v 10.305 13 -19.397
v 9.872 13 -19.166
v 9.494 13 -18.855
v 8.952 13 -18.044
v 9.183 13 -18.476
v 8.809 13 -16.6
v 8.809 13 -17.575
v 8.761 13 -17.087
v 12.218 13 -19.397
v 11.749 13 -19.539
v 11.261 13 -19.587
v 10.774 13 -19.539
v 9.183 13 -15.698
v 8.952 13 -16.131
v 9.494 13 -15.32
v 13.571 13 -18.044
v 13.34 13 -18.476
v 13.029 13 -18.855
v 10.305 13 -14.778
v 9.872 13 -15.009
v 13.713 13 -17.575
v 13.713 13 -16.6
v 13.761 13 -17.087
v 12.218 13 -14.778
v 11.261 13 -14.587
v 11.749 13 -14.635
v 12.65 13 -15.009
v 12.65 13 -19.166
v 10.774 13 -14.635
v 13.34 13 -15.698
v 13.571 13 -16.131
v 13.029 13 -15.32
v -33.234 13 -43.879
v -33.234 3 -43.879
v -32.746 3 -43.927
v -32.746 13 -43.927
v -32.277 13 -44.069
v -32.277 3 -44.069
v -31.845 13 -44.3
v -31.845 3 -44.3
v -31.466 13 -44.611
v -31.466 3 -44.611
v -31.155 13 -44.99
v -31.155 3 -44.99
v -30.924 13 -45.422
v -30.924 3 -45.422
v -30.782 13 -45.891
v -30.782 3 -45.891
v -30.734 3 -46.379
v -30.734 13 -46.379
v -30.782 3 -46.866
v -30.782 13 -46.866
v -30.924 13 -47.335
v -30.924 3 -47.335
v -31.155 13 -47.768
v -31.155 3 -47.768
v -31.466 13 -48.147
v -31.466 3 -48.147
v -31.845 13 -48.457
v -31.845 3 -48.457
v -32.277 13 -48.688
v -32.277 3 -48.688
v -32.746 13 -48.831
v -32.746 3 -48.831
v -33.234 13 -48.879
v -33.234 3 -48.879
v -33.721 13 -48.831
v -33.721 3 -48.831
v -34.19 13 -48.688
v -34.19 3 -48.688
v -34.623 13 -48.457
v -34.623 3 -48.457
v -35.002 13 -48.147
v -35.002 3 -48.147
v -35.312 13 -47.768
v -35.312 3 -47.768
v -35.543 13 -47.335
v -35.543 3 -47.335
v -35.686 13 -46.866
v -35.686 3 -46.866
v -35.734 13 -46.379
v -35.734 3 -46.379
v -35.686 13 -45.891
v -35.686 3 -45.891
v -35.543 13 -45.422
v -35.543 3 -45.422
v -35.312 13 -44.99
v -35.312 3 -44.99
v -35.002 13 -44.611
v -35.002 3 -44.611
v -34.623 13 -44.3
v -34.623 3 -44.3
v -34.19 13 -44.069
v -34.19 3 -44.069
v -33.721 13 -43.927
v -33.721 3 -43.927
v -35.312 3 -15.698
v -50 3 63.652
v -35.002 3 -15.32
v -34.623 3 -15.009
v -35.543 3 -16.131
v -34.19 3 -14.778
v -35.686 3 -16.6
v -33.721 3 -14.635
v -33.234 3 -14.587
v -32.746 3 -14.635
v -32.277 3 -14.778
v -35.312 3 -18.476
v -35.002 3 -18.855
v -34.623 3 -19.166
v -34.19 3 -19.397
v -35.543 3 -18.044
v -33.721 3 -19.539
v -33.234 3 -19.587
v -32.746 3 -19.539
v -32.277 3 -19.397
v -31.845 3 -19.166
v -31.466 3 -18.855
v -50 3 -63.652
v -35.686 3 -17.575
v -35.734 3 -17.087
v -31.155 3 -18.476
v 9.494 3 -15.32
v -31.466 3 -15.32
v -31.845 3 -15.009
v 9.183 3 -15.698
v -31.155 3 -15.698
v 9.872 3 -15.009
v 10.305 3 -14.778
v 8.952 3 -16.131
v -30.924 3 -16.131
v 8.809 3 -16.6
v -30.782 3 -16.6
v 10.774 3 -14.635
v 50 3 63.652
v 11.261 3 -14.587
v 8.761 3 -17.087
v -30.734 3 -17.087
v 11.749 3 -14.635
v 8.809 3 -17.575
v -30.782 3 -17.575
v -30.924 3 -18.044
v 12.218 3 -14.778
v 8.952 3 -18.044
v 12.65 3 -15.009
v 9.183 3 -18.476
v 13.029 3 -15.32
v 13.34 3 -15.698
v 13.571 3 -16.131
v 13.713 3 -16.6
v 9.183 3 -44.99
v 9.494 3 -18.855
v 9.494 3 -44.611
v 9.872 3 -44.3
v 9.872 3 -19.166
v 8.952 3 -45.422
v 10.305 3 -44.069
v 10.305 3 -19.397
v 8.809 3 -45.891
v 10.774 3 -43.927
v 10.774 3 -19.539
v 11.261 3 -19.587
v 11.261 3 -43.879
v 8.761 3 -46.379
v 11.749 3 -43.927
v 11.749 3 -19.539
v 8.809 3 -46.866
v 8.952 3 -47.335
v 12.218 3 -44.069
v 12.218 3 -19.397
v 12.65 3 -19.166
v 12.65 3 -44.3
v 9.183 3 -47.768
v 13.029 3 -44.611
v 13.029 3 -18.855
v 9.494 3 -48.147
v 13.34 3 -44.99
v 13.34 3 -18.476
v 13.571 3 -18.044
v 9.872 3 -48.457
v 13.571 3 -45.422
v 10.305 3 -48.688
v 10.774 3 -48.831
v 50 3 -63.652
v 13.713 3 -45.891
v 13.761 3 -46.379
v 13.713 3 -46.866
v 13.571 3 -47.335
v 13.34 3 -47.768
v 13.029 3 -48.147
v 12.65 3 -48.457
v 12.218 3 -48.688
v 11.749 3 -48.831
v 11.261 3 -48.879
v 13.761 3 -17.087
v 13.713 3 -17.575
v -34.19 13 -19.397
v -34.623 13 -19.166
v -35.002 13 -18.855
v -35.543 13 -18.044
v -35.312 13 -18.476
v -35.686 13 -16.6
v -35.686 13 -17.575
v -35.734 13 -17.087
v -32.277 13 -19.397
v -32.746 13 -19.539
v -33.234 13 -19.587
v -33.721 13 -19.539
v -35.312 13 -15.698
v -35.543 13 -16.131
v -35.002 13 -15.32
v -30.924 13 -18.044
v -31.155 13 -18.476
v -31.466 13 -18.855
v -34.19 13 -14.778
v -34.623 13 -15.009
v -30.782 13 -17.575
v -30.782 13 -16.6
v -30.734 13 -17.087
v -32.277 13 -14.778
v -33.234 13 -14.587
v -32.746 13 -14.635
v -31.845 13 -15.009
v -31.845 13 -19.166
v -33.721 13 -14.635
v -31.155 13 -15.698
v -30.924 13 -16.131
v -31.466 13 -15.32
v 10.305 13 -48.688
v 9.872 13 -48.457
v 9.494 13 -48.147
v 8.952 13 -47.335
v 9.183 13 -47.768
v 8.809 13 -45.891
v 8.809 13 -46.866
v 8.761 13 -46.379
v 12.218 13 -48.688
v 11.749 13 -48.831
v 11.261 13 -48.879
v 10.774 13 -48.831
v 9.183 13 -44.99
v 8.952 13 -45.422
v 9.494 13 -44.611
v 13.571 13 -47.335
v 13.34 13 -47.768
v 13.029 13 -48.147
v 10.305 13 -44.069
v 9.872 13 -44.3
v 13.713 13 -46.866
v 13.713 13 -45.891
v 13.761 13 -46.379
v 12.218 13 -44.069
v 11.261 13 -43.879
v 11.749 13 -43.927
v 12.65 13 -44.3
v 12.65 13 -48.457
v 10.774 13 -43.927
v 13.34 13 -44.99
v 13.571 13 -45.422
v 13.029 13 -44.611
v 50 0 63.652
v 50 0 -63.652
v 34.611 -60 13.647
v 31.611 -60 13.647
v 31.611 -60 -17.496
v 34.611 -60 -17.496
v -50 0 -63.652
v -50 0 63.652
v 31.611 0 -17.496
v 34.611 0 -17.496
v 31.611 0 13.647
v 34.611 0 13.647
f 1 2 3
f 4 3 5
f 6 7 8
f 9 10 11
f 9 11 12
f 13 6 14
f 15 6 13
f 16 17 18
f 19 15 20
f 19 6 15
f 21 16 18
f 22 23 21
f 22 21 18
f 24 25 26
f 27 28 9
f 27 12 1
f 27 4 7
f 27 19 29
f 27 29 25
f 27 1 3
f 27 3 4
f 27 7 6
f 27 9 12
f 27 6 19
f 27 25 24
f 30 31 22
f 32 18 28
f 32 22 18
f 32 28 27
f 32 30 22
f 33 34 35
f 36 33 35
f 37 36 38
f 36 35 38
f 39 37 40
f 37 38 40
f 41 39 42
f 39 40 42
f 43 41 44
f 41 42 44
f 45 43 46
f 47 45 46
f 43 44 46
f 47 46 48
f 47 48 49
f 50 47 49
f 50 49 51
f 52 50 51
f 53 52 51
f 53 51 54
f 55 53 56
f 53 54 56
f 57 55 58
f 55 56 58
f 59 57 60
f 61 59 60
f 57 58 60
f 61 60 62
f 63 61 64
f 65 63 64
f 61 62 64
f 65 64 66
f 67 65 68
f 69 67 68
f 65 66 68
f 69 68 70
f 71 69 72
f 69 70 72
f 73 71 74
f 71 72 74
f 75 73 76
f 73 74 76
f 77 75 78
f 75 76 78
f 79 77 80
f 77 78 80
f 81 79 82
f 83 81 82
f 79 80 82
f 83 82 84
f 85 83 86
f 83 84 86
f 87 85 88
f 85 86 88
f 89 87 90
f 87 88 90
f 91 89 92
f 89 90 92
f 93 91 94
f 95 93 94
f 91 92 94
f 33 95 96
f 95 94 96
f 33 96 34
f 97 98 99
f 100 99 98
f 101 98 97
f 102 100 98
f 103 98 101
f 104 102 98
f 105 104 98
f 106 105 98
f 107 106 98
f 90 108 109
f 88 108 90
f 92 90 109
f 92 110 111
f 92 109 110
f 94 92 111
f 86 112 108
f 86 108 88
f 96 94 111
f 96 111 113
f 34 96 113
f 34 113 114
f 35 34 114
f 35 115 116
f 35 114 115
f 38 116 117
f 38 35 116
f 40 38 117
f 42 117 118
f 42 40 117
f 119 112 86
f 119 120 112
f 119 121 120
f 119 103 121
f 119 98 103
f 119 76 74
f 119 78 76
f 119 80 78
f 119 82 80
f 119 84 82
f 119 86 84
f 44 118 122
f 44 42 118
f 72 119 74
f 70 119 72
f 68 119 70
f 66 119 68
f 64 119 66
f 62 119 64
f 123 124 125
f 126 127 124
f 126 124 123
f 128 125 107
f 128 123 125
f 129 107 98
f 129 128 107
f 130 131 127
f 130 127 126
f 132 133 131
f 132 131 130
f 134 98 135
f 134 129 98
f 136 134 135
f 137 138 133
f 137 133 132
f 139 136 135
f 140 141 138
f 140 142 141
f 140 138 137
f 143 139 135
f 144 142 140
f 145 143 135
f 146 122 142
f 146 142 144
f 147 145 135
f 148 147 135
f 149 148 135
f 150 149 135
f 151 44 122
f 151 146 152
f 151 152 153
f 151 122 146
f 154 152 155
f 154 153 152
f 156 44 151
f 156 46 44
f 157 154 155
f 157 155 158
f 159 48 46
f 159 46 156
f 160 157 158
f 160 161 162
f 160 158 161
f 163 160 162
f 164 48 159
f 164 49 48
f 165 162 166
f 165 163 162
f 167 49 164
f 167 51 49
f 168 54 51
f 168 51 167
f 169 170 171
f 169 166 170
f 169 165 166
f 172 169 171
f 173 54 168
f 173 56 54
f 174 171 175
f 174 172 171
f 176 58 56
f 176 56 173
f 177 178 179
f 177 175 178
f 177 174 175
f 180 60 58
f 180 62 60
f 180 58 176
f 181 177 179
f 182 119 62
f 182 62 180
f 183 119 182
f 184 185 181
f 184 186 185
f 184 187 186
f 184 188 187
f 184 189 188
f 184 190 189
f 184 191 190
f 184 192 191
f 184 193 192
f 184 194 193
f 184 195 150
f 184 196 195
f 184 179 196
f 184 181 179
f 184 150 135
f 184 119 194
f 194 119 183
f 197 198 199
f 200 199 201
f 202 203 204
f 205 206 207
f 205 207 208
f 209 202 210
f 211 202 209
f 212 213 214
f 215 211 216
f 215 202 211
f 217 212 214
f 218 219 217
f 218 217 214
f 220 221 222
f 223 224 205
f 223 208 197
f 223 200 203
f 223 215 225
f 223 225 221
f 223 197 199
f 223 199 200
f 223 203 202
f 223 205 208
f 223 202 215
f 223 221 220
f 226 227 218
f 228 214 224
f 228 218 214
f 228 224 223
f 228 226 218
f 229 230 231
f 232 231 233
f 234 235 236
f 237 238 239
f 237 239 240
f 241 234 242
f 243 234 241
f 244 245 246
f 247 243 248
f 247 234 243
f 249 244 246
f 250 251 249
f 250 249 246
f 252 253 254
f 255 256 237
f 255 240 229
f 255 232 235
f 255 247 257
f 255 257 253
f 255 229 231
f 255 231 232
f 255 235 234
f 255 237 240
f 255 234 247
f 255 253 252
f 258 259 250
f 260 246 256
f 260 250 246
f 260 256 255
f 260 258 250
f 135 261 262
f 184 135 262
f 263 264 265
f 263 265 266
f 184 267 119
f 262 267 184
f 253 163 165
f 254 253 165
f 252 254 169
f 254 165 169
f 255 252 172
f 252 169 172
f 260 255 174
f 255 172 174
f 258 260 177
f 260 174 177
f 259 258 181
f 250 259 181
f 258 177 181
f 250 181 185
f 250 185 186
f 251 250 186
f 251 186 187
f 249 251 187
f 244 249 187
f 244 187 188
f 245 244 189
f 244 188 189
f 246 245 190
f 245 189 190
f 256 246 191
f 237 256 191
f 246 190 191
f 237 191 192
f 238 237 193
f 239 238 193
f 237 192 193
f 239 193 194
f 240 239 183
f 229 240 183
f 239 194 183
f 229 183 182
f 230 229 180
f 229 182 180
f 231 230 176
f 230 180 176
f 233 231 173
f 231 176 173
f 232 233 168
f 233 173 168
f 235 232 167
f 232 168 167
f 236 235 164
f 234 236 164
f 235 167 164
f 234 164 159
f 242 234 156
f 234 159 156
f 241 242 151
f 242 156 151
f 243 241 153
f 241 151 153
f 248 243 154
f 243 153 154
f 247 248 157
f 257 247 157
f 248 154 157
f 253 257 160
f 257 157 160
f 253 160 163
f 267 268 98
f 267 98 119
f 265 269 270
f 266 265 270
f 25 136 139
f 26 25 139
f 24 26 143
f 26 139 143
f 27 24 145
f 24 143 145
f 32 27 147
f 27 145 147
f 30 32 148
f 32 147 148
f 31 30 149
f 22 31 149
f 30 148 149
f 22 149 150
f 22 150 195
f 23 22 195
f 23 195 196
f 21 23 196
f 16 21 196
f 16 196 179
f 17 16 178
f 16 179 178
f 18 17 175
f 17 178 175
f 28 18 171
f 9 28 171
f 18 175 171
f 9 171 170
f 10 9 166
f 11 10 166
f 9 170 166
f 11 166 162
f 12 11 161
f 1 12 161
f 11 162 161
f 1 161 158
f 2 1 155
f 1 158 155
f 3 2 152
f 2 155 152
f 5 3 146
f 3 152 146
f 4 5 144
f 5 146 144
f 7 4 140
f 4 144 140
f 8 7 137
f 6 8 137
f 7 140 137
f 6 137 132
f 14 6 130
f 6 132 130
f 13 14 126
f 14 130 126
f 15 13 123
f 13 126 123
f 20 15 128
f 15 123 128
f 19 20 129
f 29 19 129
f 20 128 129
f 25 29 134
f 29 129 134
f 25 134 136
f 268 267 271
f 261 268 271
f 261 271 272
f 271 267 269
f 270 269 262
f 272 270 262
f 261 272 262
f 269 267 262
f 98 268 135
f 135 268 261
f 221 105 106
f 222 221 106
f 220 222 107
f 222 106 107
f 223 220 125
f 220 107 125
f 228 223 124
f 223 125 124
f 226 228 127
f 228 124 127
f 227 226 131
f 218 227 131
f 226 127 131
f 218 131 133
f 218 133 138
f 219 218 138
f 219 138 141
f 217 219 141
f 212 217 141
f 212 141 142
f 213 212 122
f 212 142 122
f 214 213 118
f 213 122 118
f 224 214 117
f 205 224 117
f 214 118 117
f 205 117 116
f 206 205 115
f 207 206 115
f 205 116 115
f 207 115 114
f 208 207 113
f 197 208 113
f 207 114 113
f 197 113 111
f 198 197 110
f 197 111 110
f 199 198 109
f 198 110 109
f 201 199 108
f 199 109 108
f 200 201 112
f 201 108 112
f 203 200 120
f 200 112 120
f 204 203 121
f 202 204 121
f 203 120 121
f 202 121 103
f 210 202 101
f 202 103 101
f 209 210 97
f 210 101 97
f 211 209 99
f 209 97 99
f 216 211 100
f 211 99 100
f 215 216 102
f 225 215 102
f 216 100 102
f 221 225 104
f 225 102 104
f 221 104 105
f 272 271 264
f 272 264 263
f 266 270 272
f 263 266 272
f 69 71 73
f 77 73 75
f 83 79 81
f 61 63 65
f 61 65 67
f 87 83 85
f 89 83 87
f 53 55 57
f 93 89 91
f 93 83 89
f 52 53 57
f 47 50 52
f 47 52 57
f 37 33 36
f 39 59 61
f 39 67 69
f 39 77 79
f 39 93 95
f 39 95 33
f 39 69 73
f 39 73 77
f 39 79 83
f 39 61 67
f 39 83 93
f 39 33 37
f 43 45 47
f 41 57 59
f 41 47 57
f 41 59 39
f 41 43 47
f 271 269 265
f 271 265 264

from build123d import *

# Parameters (mm, degrees)
CROQUIS1_W              = 100
CROQUIS1_H              = 127.304752994
SALIENTE_EXTRUIR1_DEPTH = 3
CROQUIS2_W              = 3
CROQUIS2_H              = 31.14357053
SALIENTE_EXTRUIR2_DEPTH = 60
CROQUIS3_R              = 2.5
SALIENTE_EXTRUIR3_DEPTH = 10


with BuildPart() as part:
    # Croquis1 → Saliente-Extruir1 (new body)
    with BuildSketch(Plane(origin=(0, 0, 0), x_dir=(1, 0, 0), z_dir=(0, 1, 0))):
        Rectangle(CROQUIS1_W, CROQUIS1_H)
    extrude(amount=SALIENTE_EXTRUIR1_DEPTH)

    # Croquis2 → Saliente-Extruir2 (add)
    with BuildSketch(Plane.XZ):
        with Locations((33.110839978, -1.924439839)):
            Rectangle(CROQUIS2_W, CROQUIS2_H)
    extrude(amount=SALIENTE_EXTRUIR2_DEPTH)

    # Croquis3 → Saliente-Extruir3 (add)
    with BuildSketch(Plane(origin=(0, 3, 0), x_dir=(1, 0, 0), z_dir=(0, 1, 0))):
        with Locations(Location((11.26131509, 46.378735673, 0), (0, 0, 270))):
            Circle(CROQUIS3_R)
        with Locations(Location((11.26131509, 17.087366944, 0), (0, 0, 270))):
            Circle(CROQUIS3_R)
        with Locations(Location((-33.233745319, 17.087366944, 0), (0, 0, 270))):
            Circle(CROQUIS3_R)
        with Locations(Location((-33.233745319, 46.378735673, 0), (0, 0, 270))):
            Circle(CROQUIS3_R)
    extrude(amount=SALIENTE_EXTRUIR3_DEPTH)


solid = part.part
